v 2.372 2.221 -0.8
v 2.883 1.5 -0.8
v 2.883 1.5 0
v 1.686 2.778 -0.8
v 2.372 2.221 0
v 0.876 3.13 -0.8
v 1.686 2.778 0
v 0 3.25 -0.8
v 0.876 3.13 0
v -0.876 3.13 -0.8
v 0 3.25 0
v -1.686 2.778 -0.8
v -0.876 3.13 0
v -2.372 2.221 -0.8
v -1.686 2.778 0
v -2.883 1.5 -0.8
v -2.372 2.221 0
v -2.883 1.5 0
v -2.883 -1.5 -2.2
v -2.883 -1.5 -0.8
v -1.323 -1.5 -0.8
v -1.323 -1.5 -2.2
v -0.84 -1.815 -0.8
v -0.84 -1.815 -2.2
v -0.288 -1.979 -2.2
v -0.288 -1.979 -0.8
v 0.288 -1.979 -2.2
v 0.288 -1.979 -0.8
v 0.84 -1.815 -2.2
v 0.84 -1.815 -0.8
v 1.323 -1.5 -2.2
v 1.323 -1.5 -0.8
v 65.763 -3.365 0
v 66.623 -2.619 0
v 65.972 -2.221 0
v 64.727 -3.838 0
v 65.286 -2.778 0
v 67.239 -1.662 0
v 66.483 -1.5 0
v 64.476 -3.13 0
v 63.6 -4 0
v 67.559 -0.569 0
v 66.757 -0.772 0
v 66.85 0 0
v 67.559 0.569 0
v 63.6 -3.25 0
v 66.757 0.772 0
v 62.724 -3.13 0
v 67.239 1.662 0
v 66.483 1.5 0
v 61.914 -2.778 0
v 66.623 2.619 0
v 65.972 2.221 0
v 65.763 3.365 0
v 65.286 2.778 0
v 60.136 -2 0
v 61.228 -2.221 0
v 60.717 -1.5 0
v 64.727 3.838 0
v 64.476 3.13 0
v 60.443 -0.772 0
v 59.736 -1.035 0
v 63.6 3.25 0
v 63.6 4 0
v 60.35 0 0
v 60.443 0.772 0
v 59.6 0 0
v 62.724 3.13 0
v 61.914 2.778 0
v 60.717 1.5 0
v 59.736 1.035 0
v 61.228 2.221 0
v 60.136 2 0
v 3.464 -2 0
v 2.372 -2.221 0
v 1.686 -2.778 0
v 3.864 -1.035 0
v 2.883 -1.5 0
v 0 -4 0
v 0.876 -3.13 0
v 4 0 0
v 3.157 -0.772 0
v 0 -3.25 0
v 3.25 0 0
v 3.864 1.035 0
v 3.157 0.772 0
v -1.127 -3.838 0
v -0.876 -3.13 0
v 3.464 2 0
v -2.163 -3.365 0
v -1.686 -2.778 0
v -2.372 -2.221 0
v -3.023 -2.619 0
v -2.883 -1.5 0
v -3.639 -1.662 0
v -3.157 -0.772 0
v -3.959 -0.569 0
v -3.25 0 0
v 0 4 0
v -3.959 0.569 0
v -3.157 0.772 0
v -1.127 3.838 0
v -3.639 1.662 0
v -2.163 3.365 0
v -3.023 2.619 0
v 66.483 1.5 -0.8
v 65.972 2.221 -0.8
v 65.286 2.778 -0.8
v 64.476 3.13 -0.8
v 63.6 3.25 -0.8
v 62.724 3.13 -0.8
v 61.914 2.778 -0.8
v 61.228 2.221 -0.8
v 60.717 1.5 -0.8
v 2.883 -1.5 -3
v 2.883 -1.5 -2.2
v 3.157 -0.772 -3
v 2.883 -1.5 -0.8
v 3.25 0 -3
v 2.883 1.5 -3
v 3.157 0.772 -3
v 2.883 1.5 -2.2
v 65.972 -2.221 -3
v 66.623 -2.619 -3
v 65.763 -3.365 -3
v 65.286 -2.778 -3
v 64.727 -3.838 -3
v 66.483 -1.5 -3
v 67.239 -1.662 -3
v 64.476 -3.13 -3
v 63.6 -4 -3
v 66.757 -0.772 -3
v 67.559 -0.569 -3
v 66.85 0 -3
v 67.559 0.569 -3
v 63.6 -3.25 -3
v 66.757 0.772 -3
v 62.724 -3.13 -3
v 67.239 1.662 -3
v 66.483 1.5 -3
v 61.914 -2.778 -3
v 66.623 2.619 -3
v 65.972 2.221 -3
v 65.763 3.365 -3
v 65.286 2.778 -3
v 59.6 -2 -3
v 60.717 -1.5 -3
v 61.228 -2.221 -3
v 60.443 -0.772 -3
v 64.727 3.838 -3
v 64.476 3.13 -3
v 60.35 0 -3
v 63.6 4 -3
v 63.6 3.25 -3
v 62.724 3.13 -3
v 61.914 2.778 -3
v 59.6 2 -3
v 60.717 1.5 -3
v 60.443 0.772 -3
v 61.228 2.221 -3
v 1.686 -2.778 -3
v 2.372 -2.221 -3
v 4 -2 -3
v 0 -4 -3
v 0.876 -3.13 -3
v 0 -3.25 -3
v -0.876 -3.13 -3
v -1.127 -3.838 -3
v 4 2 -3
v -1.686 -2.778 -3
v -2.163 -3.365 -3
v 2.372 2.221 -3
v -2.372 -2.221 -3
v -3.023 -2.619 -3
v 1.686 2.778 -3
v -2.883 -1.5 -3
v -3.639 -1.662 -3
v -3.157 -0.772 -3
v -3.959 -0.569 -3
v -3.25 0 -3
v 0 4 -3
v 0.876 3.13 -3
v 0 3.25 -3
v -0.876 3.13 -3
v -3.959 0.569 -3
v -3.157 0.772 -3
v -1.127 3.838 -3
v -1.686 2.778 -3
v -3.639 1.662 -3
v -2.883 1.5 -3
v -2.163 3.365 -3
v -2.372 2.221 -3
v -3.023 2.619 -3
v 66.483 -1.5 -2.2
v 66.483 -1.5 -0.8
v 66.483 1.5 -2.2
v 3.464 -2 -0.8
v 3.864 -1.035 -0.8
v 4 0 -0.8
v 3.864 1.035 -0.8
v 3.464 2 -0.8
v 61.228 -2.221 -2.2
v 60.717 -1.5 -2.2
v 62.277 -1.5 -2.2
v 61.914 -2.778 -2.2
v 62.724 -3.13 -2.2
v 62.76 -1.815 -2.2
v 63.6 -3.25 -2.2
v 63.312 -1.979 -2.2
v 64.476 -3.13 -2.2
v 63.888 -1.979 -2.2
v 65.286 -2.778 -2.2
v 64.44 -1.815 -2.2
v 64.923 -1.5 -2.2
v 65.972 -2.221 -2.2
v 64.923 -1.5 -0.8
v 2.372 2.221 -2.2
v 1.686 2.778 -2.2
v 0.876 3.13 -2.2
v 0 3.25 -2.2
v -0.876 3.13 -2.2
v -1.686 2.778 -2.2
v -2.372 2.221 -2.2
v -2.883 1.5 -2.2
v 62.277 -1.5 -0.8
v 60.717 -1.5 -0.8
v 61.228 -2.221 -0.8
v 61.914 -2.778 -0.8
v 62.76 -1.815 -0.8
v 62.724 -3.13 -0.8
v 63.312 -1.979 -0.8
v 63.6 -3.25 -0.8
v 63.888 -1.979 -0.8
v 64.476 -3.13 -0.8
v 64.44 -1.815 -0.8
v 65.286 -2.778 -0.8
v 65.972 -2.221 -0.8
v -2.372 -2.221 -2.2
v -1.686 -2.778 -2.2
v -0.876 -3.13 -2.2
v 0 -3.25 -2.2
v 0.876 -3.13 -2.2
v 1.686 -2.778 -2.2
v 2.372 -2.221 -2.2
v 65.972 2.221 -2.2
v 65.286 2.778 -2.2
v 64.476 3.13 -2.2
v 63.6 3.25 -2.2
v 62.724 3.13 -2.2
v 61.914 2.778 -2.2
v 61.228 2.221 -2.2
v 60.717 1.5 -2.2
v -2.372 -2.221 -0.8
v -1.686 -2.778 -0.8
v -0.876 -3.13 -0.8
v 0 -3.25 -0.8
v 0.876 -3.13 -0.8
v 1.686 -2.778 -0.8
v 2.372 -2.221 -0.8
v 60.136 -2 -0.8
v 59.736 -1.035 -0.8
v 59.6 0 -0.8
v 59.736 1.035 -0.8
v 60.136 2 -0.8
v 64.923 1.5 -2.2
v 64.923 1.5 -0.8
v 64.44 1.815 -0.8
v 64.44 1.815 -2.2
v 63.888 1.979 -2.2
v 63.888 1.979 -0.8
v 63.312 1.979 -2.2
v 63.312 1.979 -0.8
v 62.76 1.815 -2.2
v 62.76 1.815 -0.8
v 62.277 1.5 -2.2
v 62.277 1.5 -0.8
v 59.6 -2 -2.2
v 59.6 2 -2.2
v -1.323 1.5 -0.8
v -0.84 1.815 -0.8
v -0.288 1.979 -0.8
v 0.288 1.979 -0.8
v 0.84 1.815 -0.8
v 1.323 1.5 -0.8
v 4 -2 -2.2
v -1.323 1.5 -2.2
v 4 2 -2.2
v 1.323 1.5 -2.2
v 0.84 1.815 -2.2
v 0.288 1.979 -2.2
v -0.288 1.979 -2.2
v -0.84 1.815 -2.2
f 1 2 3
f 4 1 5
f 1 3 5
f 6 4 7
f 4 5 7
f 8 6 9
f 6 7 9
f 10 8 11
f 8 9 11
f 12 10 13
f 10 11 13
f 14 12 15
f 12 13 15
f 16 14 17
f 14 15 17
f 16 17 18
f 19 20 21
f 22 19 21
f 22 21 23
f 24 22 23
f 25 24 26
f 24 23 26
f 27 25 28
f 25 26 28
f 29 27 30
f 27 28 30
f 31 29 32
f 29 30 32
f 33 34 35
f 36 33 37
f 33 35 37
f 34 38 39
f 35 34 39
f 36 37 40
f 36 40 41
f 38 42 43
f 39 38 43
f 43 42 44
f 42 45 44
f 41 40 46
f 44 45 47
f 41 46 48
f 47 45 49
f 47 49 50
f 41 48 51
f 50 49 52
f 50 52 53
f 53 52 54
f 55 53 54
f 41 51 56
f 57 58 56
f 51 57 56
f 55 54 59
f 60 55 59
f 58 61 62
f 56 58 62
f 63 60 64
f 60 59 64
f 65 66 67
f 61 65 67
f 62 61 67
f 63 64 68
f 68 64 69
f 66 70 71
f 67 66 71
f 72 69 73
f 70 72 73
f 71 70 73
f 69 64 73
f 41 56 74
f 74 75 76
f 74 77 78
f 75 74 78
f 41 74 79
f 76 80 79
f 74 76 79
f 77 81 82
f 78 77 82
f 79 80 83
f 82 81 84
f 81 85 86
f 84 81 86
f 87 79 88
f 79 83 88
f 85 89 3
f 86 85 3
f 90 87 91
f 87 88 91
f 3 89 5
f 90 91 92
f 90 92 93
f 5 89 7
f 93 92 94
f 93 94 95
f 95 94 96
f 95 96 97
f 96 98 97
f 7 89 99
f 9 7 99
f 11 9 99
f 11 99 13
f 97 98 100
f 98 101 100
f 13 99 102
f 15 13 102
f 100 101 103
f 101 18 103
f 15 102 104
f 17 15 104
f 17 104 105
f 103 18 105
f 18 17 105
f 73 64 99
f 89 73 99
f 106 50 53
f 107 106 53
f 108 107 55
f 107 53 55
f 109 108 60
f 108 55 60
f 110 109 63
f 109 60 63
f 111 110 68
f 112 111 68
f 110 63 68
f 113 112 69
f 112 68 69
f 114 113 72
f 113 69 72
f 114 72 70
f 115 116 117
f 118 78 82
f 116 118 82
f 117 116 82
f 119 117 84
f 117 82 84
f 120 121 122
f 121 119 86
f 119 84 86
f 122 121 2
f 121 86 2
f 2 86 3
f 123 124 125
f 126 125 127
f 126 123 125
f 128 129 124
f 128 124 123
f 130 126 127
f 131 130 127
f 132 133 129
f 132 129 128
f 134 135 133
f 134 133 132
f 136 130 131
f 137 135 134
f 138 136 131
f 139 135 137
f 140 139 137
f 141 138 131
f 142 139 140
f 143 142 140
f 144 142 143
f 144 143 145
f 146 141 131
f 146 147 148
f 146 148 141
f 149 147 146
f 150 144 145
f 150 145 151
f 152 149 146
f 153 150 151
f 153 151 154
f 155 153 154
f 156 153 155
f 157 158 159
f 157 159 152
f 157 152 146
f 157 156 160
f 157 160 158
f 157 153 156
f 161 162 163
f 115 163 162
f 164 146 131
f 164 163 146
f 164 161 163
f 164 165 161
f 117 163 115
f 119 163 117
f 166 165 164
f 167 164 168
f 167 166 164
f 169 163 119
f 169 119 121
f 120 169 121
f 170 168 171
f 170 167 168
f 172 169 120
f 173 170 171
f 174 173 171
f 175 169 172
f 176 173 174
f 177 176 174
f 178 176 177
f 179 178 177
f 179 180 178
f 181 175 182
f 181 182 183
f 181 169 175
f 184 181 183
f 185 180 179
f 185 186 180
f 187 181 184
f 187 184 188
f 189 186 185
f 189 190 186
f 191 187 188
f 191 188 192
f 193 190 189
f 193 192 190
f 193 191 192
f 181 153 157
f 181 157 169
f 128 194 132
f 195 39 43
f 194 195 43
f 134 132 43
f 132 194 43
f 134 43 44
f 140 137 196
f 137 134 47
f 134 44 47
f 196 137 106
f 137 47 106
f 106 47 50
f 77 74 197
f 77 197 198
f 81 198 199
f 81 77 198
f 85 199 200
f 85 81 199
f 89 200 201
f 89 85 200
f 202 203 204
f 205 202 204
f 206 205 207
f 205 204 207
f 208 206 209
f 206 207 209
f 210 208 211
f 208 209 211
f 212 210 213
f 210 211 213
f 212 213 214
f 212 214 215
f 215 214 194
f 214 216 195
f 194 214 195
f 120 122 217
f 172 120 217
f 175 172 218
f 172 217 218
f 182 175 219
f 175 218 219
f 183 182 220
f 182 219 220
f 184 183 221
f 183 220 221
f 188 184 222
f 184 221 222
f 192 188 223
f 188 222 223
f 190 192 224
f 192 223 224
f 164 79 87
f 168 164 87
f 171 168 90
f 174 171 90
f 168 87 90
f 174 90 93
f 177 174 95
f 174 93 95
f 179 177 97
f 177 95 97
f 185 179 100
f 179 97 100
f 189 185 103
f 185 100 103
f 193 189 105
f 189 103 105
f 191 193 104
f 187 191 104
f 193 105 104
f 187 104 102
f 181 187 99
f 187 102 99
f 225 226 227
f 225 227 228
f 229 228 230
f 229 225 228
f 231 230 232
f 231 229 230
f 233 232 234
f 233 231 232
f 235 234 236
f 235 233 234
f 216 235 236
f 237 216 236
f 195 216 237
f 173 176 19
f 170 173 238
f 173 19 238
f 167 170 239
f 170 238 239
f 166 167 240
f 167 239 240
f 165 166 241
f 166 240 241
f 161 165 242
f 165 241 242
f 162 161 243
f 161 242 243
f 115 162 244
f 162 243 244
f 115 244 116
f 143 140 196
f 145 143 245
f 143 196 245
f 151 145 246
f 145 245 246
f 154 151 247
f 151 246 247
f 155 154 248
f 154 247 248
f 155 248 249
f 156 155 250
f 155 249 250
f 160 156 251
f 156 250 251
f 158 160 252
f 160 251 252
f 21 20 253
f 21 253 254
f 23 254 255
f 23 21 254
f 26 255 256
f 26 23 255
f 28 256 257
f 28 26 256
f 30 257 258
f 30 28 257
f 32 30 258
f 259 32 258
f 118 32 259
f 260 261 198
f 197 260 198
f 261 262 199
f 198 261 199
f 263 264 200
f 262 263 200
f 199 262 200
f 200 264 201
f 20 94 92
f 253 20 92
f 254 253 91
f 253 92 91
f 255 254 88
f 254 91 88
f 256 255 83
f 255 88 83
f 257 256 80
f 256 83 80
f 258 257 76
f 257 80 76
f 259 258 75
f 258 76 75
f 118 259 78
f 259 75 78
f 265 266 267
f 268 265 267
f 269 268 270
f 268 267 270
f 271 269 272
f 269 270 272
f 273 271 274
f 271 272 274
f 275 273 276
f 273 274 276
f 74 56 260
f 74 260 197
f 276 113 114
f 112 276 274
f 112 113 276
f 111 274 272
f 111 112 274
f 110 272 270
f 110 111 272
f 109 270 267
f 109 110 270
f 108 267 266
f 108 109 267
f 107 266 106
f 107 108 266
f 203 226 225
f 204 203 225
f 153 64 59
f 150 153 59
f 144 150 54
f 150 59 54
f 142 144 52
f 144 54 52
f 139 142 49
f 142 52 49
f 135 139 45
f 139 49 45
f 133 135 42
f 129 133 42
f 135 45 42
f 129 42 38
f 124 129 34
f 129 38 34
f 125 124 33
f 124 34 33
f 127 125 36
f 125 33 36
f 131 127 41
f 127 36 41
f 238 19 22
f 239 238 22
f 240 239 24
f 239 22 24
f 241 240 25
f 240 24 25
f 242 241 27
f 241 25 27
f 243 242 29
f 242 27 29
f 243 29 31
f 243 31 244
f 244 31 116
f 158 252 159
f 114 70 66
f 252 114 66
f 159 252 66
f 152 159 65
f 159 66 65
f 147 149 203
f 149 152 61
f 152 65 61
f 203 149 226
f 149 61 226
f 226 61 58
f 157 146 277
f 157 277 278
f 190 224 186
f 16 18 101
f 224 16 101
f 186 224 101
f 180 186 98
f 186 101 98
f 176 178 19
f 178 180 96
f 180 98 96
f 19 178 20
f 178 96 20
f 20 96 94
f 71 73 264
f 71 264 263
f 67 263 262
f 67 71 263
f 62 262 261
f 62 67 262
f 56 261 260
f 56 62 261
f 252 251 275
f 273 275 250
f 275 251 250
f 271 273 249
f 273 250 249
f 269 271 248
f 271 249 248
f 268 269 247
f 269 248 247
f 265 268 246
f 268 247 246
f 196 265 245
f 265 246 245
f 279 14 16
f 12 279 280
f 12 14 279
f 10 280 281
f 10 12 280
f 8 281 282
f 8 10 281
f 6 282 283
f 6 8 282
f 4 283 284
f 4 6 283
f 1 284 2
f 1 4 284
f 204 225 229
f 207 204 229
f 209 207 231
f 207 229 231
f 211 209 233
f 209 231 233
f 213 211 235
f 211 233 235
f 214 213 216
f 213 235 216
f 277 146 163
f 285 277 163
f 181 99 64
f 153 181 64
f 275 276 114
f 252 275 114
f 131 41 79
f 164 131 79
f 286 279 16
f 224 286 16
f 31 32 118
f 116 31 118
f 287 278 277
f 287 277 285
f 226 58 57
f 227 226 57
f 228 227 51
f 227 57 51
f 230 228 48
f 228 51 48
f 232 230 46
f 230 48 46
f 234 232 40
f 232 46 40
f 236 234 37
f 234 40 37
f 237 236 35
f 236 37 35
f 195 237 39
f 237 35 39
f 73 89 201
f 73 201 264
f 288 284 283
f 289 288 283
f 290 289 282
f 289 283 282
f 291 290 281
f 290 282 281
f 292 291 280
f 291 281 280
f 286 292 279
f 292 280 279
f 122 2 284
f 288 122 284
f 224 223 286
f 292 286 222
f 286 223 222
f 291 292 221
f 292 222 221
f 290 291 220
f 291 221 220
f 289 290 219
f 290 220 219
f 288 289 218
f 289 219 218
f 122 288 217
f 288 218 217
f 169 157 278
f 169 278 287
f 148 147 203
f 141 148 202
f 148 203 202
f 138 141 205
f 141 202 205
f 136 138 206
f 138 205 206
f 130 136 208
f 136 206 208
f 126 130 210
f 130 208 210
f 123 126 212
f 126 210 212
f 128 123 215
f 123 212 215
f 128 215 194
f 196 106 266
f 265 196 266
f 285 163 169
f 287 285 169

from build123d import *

# Parameters (mm, degrees)
EXTRUDE_1_DEPTH        = 3
CUT_EXTRUDE_1_REACH    = 69.785
SKETCH_3_R             = 3.25
CUT_EXTRUDE_2_DEPTH    = 0.8
CUT_EXTRUDE_START      = -2.2
SKETCH_3_2_R           = 3.25
CUT_EXTRUDE_3_DEPTH    = 0.8
PATTERN_LINEAR_1_COUNT = 2
PATTERN_LINEAR_1_PITCH = 63.6
CUT_EXTRUDE_4_DEPTH    = 0.8
SKETCH_5_W             = 55.6
SKETCH_5_H             = 4
CUT_EXTRUDE_5_DEPTH    = 0.8


with BuildPart() as part:
    # 草图1 → 凸台-拉伸1 (new body)
    with BuildSketch(Plane.XY):
        with BuildLine():
            Line((0, 4), (63.6, 4))
            ThreePointArc((63.6, 4), (67.6, 0), (63.6, -4))
            Line((63.6, -4), (0, -4))
            ThreePointArc((0, -4), (-4, 0), (0, 4))
        make_face()
    extrude(amount=-EXTRUDE_1_DEPTH)

    # 草图2 → 切除-拉伸1 (cut, up to next)
    with BuildSketch(Plane.XY, mode=Mode.PRIVATE) as cut_extrude_1_sk1:
        with BuildLine():
            Line((1.322875656, -1.5), (2.883140649, -1.5))
            ThreePointArc((2.883140649, -1.5), (3.25, 0), (2.883140649, 1.5))
            Line((2.883140649, 1.5), (1.322875656, 1.5))
            ThreePointArc((1.322875656, 1.5), (0, 2), (-1.322875656, 1.5))
            Line((-1.322875656, 1.5), (-2.883140649, 1.5))
            ThreePointArc((-2.883140649, 1.5), (-3.25, 0), (-2.883140649, -1.5))
            Line((-2.883140649, -1.5), (-1.322875656, -1.5))
            ThreePointArc((-1.322875656, -1.5), (0, -2), (1.322875656, -1.5))
        make_face()
    cut_extrude_1_tool1 = extrude(cut_extrude_1_sk1.sketch, amount=-CUT_EXTRUDE_1_REACH, mode=Mode.PRIVATE) & part.part
    cut_extrude_1 = cut_extrude_1_tool1.solids().sort_by_distance((0, 0, 0))[0]
    add(cut_extrude_1, mode=Mode.SUBTRACT)

    # 草图3 → 切除-拉伸2 (cut)
    with BuildSketch(Plane.XY):
        Circle(SKETCH_3_R)
    cut_extrude_2 = extrude(amount=-CUT_EXTRUDE_2_DEPTH, mode=Mode.SUBTRACT)

    # 草图3<2> → 切除-拉伸3 (cut)
    with BuildSketch(Plane.XY.offset(CUT_EXTRUDE_START)):
        Circle(SKETCH_3_2_R)
    cut_extrude_3 = extrude(amount=-CUT_EXTRUDE_3_DEPTH, mode=Mode.SUBTRACT)

    # 阵列(线性)1: 切除-拉伸1, 切除-拉伸2, 切除-拉伸3 ×2
    with Locations(*[(i * PATTERN_LINEAR_1_PITCH, 0, 0) for i in range(1, PATTERN_LINEAR_1_COUNT)]):
        add(cut_extrude_1, mode=Mode.SUBTRACT)
        add(cut_extrude_2, mode=Mode.SUBTRACT)
        add(cut_extrude_3, mode=Mode.SUBTRACT)

    # 草图4 → 切除-拉伸4 (cut)
    with BuildSketch(Plane.XY):
        with BuildLine():
            Line((3.464101615, 2), (60.135898385, 2))
            ThreePointArc((60.135898385, 2), (59.6, 0), (60.135898385, -2))
            Line((60.135898385, -2), (3.464101615, -2))
            ThreePointArc((3.464101615, -2), (4, 0), (3.464101615, 2))
        make_face()
    extrude(amount=-CUT_EXTRUDE_4_DEPTH, mode=Mode.SUBTRACT)

    # 草图5 → 切除-拉伸5 (cut)
    with BuildSketch(Plane(origin=(0, 0, -3), x_dir=(-1, 0, 0), z_dir=(0, 0, -1))):
        with Locations((-31.8, 0)):
            Rectangle(SKETCH_5_W, SKETCH_5_H)
    extrude(amount=-CUT_EXTRUDE_5_DEPTH, mode=Mode.SUBTRACT)


solid = part.part
